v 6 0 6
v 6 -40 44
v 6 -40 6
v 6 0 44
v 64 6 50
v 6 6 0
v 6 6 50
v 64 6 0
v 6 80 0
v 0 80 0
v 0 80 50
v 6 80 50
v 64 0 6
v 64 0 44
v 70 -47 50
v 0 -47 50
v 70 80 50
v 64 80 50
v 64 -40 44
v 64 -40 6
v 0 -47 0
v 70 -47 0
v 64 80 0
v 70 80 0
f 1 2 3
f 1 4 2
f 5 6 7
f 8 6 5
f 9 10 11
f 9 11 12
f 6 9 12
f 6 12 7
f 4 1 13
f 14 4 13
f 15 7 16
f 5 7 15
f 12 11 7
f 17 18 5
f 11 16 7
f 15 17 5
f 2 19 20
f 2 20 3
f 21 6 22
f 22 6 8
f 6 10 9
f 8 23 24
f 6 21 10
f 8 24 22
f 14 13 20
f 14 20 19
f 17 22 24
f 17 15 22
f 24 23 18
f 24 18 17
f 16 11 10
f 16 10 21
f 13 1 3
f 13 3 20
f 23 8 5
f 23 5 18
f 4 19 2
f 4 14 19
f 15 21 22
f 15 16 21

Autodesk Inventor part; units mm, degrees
ref_plane "YZ Plane" through (0, 0, 0) normal (1, 0, 0) x (0, 1, 0)
ref_plane "XZ Plane" through (0, 0, 0) normal (0, 1, 0) x (-1, 0, 0)
ref_plane "XY Plane" through (0, 0, 0) normal (0, 0, 1) x (1, 0, 0)
sketch "Sketch1" plane through (0, 0, 0) normal (0, 0, 1) x (1, 0, 0)
  line L0 (0, 80) -> (0, 0)
  line L1 (0, 0) -> (70, 0)
  line L2 (70, 0) -> (70, 80)
  line L3 (6, 80) -> (6, 6)
  line L4 (6, 6) -> (64, 6)
  line L5 (64, 6) -> (64, 80)
  line L6 (0, 80) -> (6, 80)
  line L7 (64, 80) -> (70, 80)
  dimension "d0" = 70
  dimension "d1" = 80
  dimension "d2" = 80
  dimension "d3" = 6
extrude "Extrusion1" add sketch "Sketch1" along normal blind 50
sketch "Sketch2" plane through (0, 0, 0) normal (0, -1, 0) x (1, 0, 0)
  line L0 (6, 0) -> (0, 0) projected
  line L1 (0, 50) -> (70, 50) projected
  line L2 (0, 0) -> (70, 0)
  line L3 (70, 0) -> (70, 50)
  line L4 (70, 50) -> (0, 50)
  line L5 (0, 50) -> (0, 0)
  line L6 (6, 6) -> (64, 6)
  line L7 (64, 6) -> (64, 44)
  line L8 (64, 44) -> (6, 44)
  line L9 (6, 44) -> (6, 6)
  dimension "d7" = 6
extrude "Extrusion2" add sketch "Sketch2" along normal blind 40
sketch "Sketch3" plane through (0, 0, 50) normal (0, 0, 1) x (1, 0, 0)
  line L0 (70, 80) -> (70, -40) projected
  line L1 (70, -40) -> (0, -40)
  line L2 (0, -40) -> (0, -47)
  line L3 (0, -47) -> (70, -47)
  line L4 (70, -47) -> (70, -40)
  point P0 (0, 0)
  dimension "d15" = 70
  dimension "d16" = 7
extrude "Extrusion4" add sketch "Sketch3" against normal blind 50
properties part number "armj4"
